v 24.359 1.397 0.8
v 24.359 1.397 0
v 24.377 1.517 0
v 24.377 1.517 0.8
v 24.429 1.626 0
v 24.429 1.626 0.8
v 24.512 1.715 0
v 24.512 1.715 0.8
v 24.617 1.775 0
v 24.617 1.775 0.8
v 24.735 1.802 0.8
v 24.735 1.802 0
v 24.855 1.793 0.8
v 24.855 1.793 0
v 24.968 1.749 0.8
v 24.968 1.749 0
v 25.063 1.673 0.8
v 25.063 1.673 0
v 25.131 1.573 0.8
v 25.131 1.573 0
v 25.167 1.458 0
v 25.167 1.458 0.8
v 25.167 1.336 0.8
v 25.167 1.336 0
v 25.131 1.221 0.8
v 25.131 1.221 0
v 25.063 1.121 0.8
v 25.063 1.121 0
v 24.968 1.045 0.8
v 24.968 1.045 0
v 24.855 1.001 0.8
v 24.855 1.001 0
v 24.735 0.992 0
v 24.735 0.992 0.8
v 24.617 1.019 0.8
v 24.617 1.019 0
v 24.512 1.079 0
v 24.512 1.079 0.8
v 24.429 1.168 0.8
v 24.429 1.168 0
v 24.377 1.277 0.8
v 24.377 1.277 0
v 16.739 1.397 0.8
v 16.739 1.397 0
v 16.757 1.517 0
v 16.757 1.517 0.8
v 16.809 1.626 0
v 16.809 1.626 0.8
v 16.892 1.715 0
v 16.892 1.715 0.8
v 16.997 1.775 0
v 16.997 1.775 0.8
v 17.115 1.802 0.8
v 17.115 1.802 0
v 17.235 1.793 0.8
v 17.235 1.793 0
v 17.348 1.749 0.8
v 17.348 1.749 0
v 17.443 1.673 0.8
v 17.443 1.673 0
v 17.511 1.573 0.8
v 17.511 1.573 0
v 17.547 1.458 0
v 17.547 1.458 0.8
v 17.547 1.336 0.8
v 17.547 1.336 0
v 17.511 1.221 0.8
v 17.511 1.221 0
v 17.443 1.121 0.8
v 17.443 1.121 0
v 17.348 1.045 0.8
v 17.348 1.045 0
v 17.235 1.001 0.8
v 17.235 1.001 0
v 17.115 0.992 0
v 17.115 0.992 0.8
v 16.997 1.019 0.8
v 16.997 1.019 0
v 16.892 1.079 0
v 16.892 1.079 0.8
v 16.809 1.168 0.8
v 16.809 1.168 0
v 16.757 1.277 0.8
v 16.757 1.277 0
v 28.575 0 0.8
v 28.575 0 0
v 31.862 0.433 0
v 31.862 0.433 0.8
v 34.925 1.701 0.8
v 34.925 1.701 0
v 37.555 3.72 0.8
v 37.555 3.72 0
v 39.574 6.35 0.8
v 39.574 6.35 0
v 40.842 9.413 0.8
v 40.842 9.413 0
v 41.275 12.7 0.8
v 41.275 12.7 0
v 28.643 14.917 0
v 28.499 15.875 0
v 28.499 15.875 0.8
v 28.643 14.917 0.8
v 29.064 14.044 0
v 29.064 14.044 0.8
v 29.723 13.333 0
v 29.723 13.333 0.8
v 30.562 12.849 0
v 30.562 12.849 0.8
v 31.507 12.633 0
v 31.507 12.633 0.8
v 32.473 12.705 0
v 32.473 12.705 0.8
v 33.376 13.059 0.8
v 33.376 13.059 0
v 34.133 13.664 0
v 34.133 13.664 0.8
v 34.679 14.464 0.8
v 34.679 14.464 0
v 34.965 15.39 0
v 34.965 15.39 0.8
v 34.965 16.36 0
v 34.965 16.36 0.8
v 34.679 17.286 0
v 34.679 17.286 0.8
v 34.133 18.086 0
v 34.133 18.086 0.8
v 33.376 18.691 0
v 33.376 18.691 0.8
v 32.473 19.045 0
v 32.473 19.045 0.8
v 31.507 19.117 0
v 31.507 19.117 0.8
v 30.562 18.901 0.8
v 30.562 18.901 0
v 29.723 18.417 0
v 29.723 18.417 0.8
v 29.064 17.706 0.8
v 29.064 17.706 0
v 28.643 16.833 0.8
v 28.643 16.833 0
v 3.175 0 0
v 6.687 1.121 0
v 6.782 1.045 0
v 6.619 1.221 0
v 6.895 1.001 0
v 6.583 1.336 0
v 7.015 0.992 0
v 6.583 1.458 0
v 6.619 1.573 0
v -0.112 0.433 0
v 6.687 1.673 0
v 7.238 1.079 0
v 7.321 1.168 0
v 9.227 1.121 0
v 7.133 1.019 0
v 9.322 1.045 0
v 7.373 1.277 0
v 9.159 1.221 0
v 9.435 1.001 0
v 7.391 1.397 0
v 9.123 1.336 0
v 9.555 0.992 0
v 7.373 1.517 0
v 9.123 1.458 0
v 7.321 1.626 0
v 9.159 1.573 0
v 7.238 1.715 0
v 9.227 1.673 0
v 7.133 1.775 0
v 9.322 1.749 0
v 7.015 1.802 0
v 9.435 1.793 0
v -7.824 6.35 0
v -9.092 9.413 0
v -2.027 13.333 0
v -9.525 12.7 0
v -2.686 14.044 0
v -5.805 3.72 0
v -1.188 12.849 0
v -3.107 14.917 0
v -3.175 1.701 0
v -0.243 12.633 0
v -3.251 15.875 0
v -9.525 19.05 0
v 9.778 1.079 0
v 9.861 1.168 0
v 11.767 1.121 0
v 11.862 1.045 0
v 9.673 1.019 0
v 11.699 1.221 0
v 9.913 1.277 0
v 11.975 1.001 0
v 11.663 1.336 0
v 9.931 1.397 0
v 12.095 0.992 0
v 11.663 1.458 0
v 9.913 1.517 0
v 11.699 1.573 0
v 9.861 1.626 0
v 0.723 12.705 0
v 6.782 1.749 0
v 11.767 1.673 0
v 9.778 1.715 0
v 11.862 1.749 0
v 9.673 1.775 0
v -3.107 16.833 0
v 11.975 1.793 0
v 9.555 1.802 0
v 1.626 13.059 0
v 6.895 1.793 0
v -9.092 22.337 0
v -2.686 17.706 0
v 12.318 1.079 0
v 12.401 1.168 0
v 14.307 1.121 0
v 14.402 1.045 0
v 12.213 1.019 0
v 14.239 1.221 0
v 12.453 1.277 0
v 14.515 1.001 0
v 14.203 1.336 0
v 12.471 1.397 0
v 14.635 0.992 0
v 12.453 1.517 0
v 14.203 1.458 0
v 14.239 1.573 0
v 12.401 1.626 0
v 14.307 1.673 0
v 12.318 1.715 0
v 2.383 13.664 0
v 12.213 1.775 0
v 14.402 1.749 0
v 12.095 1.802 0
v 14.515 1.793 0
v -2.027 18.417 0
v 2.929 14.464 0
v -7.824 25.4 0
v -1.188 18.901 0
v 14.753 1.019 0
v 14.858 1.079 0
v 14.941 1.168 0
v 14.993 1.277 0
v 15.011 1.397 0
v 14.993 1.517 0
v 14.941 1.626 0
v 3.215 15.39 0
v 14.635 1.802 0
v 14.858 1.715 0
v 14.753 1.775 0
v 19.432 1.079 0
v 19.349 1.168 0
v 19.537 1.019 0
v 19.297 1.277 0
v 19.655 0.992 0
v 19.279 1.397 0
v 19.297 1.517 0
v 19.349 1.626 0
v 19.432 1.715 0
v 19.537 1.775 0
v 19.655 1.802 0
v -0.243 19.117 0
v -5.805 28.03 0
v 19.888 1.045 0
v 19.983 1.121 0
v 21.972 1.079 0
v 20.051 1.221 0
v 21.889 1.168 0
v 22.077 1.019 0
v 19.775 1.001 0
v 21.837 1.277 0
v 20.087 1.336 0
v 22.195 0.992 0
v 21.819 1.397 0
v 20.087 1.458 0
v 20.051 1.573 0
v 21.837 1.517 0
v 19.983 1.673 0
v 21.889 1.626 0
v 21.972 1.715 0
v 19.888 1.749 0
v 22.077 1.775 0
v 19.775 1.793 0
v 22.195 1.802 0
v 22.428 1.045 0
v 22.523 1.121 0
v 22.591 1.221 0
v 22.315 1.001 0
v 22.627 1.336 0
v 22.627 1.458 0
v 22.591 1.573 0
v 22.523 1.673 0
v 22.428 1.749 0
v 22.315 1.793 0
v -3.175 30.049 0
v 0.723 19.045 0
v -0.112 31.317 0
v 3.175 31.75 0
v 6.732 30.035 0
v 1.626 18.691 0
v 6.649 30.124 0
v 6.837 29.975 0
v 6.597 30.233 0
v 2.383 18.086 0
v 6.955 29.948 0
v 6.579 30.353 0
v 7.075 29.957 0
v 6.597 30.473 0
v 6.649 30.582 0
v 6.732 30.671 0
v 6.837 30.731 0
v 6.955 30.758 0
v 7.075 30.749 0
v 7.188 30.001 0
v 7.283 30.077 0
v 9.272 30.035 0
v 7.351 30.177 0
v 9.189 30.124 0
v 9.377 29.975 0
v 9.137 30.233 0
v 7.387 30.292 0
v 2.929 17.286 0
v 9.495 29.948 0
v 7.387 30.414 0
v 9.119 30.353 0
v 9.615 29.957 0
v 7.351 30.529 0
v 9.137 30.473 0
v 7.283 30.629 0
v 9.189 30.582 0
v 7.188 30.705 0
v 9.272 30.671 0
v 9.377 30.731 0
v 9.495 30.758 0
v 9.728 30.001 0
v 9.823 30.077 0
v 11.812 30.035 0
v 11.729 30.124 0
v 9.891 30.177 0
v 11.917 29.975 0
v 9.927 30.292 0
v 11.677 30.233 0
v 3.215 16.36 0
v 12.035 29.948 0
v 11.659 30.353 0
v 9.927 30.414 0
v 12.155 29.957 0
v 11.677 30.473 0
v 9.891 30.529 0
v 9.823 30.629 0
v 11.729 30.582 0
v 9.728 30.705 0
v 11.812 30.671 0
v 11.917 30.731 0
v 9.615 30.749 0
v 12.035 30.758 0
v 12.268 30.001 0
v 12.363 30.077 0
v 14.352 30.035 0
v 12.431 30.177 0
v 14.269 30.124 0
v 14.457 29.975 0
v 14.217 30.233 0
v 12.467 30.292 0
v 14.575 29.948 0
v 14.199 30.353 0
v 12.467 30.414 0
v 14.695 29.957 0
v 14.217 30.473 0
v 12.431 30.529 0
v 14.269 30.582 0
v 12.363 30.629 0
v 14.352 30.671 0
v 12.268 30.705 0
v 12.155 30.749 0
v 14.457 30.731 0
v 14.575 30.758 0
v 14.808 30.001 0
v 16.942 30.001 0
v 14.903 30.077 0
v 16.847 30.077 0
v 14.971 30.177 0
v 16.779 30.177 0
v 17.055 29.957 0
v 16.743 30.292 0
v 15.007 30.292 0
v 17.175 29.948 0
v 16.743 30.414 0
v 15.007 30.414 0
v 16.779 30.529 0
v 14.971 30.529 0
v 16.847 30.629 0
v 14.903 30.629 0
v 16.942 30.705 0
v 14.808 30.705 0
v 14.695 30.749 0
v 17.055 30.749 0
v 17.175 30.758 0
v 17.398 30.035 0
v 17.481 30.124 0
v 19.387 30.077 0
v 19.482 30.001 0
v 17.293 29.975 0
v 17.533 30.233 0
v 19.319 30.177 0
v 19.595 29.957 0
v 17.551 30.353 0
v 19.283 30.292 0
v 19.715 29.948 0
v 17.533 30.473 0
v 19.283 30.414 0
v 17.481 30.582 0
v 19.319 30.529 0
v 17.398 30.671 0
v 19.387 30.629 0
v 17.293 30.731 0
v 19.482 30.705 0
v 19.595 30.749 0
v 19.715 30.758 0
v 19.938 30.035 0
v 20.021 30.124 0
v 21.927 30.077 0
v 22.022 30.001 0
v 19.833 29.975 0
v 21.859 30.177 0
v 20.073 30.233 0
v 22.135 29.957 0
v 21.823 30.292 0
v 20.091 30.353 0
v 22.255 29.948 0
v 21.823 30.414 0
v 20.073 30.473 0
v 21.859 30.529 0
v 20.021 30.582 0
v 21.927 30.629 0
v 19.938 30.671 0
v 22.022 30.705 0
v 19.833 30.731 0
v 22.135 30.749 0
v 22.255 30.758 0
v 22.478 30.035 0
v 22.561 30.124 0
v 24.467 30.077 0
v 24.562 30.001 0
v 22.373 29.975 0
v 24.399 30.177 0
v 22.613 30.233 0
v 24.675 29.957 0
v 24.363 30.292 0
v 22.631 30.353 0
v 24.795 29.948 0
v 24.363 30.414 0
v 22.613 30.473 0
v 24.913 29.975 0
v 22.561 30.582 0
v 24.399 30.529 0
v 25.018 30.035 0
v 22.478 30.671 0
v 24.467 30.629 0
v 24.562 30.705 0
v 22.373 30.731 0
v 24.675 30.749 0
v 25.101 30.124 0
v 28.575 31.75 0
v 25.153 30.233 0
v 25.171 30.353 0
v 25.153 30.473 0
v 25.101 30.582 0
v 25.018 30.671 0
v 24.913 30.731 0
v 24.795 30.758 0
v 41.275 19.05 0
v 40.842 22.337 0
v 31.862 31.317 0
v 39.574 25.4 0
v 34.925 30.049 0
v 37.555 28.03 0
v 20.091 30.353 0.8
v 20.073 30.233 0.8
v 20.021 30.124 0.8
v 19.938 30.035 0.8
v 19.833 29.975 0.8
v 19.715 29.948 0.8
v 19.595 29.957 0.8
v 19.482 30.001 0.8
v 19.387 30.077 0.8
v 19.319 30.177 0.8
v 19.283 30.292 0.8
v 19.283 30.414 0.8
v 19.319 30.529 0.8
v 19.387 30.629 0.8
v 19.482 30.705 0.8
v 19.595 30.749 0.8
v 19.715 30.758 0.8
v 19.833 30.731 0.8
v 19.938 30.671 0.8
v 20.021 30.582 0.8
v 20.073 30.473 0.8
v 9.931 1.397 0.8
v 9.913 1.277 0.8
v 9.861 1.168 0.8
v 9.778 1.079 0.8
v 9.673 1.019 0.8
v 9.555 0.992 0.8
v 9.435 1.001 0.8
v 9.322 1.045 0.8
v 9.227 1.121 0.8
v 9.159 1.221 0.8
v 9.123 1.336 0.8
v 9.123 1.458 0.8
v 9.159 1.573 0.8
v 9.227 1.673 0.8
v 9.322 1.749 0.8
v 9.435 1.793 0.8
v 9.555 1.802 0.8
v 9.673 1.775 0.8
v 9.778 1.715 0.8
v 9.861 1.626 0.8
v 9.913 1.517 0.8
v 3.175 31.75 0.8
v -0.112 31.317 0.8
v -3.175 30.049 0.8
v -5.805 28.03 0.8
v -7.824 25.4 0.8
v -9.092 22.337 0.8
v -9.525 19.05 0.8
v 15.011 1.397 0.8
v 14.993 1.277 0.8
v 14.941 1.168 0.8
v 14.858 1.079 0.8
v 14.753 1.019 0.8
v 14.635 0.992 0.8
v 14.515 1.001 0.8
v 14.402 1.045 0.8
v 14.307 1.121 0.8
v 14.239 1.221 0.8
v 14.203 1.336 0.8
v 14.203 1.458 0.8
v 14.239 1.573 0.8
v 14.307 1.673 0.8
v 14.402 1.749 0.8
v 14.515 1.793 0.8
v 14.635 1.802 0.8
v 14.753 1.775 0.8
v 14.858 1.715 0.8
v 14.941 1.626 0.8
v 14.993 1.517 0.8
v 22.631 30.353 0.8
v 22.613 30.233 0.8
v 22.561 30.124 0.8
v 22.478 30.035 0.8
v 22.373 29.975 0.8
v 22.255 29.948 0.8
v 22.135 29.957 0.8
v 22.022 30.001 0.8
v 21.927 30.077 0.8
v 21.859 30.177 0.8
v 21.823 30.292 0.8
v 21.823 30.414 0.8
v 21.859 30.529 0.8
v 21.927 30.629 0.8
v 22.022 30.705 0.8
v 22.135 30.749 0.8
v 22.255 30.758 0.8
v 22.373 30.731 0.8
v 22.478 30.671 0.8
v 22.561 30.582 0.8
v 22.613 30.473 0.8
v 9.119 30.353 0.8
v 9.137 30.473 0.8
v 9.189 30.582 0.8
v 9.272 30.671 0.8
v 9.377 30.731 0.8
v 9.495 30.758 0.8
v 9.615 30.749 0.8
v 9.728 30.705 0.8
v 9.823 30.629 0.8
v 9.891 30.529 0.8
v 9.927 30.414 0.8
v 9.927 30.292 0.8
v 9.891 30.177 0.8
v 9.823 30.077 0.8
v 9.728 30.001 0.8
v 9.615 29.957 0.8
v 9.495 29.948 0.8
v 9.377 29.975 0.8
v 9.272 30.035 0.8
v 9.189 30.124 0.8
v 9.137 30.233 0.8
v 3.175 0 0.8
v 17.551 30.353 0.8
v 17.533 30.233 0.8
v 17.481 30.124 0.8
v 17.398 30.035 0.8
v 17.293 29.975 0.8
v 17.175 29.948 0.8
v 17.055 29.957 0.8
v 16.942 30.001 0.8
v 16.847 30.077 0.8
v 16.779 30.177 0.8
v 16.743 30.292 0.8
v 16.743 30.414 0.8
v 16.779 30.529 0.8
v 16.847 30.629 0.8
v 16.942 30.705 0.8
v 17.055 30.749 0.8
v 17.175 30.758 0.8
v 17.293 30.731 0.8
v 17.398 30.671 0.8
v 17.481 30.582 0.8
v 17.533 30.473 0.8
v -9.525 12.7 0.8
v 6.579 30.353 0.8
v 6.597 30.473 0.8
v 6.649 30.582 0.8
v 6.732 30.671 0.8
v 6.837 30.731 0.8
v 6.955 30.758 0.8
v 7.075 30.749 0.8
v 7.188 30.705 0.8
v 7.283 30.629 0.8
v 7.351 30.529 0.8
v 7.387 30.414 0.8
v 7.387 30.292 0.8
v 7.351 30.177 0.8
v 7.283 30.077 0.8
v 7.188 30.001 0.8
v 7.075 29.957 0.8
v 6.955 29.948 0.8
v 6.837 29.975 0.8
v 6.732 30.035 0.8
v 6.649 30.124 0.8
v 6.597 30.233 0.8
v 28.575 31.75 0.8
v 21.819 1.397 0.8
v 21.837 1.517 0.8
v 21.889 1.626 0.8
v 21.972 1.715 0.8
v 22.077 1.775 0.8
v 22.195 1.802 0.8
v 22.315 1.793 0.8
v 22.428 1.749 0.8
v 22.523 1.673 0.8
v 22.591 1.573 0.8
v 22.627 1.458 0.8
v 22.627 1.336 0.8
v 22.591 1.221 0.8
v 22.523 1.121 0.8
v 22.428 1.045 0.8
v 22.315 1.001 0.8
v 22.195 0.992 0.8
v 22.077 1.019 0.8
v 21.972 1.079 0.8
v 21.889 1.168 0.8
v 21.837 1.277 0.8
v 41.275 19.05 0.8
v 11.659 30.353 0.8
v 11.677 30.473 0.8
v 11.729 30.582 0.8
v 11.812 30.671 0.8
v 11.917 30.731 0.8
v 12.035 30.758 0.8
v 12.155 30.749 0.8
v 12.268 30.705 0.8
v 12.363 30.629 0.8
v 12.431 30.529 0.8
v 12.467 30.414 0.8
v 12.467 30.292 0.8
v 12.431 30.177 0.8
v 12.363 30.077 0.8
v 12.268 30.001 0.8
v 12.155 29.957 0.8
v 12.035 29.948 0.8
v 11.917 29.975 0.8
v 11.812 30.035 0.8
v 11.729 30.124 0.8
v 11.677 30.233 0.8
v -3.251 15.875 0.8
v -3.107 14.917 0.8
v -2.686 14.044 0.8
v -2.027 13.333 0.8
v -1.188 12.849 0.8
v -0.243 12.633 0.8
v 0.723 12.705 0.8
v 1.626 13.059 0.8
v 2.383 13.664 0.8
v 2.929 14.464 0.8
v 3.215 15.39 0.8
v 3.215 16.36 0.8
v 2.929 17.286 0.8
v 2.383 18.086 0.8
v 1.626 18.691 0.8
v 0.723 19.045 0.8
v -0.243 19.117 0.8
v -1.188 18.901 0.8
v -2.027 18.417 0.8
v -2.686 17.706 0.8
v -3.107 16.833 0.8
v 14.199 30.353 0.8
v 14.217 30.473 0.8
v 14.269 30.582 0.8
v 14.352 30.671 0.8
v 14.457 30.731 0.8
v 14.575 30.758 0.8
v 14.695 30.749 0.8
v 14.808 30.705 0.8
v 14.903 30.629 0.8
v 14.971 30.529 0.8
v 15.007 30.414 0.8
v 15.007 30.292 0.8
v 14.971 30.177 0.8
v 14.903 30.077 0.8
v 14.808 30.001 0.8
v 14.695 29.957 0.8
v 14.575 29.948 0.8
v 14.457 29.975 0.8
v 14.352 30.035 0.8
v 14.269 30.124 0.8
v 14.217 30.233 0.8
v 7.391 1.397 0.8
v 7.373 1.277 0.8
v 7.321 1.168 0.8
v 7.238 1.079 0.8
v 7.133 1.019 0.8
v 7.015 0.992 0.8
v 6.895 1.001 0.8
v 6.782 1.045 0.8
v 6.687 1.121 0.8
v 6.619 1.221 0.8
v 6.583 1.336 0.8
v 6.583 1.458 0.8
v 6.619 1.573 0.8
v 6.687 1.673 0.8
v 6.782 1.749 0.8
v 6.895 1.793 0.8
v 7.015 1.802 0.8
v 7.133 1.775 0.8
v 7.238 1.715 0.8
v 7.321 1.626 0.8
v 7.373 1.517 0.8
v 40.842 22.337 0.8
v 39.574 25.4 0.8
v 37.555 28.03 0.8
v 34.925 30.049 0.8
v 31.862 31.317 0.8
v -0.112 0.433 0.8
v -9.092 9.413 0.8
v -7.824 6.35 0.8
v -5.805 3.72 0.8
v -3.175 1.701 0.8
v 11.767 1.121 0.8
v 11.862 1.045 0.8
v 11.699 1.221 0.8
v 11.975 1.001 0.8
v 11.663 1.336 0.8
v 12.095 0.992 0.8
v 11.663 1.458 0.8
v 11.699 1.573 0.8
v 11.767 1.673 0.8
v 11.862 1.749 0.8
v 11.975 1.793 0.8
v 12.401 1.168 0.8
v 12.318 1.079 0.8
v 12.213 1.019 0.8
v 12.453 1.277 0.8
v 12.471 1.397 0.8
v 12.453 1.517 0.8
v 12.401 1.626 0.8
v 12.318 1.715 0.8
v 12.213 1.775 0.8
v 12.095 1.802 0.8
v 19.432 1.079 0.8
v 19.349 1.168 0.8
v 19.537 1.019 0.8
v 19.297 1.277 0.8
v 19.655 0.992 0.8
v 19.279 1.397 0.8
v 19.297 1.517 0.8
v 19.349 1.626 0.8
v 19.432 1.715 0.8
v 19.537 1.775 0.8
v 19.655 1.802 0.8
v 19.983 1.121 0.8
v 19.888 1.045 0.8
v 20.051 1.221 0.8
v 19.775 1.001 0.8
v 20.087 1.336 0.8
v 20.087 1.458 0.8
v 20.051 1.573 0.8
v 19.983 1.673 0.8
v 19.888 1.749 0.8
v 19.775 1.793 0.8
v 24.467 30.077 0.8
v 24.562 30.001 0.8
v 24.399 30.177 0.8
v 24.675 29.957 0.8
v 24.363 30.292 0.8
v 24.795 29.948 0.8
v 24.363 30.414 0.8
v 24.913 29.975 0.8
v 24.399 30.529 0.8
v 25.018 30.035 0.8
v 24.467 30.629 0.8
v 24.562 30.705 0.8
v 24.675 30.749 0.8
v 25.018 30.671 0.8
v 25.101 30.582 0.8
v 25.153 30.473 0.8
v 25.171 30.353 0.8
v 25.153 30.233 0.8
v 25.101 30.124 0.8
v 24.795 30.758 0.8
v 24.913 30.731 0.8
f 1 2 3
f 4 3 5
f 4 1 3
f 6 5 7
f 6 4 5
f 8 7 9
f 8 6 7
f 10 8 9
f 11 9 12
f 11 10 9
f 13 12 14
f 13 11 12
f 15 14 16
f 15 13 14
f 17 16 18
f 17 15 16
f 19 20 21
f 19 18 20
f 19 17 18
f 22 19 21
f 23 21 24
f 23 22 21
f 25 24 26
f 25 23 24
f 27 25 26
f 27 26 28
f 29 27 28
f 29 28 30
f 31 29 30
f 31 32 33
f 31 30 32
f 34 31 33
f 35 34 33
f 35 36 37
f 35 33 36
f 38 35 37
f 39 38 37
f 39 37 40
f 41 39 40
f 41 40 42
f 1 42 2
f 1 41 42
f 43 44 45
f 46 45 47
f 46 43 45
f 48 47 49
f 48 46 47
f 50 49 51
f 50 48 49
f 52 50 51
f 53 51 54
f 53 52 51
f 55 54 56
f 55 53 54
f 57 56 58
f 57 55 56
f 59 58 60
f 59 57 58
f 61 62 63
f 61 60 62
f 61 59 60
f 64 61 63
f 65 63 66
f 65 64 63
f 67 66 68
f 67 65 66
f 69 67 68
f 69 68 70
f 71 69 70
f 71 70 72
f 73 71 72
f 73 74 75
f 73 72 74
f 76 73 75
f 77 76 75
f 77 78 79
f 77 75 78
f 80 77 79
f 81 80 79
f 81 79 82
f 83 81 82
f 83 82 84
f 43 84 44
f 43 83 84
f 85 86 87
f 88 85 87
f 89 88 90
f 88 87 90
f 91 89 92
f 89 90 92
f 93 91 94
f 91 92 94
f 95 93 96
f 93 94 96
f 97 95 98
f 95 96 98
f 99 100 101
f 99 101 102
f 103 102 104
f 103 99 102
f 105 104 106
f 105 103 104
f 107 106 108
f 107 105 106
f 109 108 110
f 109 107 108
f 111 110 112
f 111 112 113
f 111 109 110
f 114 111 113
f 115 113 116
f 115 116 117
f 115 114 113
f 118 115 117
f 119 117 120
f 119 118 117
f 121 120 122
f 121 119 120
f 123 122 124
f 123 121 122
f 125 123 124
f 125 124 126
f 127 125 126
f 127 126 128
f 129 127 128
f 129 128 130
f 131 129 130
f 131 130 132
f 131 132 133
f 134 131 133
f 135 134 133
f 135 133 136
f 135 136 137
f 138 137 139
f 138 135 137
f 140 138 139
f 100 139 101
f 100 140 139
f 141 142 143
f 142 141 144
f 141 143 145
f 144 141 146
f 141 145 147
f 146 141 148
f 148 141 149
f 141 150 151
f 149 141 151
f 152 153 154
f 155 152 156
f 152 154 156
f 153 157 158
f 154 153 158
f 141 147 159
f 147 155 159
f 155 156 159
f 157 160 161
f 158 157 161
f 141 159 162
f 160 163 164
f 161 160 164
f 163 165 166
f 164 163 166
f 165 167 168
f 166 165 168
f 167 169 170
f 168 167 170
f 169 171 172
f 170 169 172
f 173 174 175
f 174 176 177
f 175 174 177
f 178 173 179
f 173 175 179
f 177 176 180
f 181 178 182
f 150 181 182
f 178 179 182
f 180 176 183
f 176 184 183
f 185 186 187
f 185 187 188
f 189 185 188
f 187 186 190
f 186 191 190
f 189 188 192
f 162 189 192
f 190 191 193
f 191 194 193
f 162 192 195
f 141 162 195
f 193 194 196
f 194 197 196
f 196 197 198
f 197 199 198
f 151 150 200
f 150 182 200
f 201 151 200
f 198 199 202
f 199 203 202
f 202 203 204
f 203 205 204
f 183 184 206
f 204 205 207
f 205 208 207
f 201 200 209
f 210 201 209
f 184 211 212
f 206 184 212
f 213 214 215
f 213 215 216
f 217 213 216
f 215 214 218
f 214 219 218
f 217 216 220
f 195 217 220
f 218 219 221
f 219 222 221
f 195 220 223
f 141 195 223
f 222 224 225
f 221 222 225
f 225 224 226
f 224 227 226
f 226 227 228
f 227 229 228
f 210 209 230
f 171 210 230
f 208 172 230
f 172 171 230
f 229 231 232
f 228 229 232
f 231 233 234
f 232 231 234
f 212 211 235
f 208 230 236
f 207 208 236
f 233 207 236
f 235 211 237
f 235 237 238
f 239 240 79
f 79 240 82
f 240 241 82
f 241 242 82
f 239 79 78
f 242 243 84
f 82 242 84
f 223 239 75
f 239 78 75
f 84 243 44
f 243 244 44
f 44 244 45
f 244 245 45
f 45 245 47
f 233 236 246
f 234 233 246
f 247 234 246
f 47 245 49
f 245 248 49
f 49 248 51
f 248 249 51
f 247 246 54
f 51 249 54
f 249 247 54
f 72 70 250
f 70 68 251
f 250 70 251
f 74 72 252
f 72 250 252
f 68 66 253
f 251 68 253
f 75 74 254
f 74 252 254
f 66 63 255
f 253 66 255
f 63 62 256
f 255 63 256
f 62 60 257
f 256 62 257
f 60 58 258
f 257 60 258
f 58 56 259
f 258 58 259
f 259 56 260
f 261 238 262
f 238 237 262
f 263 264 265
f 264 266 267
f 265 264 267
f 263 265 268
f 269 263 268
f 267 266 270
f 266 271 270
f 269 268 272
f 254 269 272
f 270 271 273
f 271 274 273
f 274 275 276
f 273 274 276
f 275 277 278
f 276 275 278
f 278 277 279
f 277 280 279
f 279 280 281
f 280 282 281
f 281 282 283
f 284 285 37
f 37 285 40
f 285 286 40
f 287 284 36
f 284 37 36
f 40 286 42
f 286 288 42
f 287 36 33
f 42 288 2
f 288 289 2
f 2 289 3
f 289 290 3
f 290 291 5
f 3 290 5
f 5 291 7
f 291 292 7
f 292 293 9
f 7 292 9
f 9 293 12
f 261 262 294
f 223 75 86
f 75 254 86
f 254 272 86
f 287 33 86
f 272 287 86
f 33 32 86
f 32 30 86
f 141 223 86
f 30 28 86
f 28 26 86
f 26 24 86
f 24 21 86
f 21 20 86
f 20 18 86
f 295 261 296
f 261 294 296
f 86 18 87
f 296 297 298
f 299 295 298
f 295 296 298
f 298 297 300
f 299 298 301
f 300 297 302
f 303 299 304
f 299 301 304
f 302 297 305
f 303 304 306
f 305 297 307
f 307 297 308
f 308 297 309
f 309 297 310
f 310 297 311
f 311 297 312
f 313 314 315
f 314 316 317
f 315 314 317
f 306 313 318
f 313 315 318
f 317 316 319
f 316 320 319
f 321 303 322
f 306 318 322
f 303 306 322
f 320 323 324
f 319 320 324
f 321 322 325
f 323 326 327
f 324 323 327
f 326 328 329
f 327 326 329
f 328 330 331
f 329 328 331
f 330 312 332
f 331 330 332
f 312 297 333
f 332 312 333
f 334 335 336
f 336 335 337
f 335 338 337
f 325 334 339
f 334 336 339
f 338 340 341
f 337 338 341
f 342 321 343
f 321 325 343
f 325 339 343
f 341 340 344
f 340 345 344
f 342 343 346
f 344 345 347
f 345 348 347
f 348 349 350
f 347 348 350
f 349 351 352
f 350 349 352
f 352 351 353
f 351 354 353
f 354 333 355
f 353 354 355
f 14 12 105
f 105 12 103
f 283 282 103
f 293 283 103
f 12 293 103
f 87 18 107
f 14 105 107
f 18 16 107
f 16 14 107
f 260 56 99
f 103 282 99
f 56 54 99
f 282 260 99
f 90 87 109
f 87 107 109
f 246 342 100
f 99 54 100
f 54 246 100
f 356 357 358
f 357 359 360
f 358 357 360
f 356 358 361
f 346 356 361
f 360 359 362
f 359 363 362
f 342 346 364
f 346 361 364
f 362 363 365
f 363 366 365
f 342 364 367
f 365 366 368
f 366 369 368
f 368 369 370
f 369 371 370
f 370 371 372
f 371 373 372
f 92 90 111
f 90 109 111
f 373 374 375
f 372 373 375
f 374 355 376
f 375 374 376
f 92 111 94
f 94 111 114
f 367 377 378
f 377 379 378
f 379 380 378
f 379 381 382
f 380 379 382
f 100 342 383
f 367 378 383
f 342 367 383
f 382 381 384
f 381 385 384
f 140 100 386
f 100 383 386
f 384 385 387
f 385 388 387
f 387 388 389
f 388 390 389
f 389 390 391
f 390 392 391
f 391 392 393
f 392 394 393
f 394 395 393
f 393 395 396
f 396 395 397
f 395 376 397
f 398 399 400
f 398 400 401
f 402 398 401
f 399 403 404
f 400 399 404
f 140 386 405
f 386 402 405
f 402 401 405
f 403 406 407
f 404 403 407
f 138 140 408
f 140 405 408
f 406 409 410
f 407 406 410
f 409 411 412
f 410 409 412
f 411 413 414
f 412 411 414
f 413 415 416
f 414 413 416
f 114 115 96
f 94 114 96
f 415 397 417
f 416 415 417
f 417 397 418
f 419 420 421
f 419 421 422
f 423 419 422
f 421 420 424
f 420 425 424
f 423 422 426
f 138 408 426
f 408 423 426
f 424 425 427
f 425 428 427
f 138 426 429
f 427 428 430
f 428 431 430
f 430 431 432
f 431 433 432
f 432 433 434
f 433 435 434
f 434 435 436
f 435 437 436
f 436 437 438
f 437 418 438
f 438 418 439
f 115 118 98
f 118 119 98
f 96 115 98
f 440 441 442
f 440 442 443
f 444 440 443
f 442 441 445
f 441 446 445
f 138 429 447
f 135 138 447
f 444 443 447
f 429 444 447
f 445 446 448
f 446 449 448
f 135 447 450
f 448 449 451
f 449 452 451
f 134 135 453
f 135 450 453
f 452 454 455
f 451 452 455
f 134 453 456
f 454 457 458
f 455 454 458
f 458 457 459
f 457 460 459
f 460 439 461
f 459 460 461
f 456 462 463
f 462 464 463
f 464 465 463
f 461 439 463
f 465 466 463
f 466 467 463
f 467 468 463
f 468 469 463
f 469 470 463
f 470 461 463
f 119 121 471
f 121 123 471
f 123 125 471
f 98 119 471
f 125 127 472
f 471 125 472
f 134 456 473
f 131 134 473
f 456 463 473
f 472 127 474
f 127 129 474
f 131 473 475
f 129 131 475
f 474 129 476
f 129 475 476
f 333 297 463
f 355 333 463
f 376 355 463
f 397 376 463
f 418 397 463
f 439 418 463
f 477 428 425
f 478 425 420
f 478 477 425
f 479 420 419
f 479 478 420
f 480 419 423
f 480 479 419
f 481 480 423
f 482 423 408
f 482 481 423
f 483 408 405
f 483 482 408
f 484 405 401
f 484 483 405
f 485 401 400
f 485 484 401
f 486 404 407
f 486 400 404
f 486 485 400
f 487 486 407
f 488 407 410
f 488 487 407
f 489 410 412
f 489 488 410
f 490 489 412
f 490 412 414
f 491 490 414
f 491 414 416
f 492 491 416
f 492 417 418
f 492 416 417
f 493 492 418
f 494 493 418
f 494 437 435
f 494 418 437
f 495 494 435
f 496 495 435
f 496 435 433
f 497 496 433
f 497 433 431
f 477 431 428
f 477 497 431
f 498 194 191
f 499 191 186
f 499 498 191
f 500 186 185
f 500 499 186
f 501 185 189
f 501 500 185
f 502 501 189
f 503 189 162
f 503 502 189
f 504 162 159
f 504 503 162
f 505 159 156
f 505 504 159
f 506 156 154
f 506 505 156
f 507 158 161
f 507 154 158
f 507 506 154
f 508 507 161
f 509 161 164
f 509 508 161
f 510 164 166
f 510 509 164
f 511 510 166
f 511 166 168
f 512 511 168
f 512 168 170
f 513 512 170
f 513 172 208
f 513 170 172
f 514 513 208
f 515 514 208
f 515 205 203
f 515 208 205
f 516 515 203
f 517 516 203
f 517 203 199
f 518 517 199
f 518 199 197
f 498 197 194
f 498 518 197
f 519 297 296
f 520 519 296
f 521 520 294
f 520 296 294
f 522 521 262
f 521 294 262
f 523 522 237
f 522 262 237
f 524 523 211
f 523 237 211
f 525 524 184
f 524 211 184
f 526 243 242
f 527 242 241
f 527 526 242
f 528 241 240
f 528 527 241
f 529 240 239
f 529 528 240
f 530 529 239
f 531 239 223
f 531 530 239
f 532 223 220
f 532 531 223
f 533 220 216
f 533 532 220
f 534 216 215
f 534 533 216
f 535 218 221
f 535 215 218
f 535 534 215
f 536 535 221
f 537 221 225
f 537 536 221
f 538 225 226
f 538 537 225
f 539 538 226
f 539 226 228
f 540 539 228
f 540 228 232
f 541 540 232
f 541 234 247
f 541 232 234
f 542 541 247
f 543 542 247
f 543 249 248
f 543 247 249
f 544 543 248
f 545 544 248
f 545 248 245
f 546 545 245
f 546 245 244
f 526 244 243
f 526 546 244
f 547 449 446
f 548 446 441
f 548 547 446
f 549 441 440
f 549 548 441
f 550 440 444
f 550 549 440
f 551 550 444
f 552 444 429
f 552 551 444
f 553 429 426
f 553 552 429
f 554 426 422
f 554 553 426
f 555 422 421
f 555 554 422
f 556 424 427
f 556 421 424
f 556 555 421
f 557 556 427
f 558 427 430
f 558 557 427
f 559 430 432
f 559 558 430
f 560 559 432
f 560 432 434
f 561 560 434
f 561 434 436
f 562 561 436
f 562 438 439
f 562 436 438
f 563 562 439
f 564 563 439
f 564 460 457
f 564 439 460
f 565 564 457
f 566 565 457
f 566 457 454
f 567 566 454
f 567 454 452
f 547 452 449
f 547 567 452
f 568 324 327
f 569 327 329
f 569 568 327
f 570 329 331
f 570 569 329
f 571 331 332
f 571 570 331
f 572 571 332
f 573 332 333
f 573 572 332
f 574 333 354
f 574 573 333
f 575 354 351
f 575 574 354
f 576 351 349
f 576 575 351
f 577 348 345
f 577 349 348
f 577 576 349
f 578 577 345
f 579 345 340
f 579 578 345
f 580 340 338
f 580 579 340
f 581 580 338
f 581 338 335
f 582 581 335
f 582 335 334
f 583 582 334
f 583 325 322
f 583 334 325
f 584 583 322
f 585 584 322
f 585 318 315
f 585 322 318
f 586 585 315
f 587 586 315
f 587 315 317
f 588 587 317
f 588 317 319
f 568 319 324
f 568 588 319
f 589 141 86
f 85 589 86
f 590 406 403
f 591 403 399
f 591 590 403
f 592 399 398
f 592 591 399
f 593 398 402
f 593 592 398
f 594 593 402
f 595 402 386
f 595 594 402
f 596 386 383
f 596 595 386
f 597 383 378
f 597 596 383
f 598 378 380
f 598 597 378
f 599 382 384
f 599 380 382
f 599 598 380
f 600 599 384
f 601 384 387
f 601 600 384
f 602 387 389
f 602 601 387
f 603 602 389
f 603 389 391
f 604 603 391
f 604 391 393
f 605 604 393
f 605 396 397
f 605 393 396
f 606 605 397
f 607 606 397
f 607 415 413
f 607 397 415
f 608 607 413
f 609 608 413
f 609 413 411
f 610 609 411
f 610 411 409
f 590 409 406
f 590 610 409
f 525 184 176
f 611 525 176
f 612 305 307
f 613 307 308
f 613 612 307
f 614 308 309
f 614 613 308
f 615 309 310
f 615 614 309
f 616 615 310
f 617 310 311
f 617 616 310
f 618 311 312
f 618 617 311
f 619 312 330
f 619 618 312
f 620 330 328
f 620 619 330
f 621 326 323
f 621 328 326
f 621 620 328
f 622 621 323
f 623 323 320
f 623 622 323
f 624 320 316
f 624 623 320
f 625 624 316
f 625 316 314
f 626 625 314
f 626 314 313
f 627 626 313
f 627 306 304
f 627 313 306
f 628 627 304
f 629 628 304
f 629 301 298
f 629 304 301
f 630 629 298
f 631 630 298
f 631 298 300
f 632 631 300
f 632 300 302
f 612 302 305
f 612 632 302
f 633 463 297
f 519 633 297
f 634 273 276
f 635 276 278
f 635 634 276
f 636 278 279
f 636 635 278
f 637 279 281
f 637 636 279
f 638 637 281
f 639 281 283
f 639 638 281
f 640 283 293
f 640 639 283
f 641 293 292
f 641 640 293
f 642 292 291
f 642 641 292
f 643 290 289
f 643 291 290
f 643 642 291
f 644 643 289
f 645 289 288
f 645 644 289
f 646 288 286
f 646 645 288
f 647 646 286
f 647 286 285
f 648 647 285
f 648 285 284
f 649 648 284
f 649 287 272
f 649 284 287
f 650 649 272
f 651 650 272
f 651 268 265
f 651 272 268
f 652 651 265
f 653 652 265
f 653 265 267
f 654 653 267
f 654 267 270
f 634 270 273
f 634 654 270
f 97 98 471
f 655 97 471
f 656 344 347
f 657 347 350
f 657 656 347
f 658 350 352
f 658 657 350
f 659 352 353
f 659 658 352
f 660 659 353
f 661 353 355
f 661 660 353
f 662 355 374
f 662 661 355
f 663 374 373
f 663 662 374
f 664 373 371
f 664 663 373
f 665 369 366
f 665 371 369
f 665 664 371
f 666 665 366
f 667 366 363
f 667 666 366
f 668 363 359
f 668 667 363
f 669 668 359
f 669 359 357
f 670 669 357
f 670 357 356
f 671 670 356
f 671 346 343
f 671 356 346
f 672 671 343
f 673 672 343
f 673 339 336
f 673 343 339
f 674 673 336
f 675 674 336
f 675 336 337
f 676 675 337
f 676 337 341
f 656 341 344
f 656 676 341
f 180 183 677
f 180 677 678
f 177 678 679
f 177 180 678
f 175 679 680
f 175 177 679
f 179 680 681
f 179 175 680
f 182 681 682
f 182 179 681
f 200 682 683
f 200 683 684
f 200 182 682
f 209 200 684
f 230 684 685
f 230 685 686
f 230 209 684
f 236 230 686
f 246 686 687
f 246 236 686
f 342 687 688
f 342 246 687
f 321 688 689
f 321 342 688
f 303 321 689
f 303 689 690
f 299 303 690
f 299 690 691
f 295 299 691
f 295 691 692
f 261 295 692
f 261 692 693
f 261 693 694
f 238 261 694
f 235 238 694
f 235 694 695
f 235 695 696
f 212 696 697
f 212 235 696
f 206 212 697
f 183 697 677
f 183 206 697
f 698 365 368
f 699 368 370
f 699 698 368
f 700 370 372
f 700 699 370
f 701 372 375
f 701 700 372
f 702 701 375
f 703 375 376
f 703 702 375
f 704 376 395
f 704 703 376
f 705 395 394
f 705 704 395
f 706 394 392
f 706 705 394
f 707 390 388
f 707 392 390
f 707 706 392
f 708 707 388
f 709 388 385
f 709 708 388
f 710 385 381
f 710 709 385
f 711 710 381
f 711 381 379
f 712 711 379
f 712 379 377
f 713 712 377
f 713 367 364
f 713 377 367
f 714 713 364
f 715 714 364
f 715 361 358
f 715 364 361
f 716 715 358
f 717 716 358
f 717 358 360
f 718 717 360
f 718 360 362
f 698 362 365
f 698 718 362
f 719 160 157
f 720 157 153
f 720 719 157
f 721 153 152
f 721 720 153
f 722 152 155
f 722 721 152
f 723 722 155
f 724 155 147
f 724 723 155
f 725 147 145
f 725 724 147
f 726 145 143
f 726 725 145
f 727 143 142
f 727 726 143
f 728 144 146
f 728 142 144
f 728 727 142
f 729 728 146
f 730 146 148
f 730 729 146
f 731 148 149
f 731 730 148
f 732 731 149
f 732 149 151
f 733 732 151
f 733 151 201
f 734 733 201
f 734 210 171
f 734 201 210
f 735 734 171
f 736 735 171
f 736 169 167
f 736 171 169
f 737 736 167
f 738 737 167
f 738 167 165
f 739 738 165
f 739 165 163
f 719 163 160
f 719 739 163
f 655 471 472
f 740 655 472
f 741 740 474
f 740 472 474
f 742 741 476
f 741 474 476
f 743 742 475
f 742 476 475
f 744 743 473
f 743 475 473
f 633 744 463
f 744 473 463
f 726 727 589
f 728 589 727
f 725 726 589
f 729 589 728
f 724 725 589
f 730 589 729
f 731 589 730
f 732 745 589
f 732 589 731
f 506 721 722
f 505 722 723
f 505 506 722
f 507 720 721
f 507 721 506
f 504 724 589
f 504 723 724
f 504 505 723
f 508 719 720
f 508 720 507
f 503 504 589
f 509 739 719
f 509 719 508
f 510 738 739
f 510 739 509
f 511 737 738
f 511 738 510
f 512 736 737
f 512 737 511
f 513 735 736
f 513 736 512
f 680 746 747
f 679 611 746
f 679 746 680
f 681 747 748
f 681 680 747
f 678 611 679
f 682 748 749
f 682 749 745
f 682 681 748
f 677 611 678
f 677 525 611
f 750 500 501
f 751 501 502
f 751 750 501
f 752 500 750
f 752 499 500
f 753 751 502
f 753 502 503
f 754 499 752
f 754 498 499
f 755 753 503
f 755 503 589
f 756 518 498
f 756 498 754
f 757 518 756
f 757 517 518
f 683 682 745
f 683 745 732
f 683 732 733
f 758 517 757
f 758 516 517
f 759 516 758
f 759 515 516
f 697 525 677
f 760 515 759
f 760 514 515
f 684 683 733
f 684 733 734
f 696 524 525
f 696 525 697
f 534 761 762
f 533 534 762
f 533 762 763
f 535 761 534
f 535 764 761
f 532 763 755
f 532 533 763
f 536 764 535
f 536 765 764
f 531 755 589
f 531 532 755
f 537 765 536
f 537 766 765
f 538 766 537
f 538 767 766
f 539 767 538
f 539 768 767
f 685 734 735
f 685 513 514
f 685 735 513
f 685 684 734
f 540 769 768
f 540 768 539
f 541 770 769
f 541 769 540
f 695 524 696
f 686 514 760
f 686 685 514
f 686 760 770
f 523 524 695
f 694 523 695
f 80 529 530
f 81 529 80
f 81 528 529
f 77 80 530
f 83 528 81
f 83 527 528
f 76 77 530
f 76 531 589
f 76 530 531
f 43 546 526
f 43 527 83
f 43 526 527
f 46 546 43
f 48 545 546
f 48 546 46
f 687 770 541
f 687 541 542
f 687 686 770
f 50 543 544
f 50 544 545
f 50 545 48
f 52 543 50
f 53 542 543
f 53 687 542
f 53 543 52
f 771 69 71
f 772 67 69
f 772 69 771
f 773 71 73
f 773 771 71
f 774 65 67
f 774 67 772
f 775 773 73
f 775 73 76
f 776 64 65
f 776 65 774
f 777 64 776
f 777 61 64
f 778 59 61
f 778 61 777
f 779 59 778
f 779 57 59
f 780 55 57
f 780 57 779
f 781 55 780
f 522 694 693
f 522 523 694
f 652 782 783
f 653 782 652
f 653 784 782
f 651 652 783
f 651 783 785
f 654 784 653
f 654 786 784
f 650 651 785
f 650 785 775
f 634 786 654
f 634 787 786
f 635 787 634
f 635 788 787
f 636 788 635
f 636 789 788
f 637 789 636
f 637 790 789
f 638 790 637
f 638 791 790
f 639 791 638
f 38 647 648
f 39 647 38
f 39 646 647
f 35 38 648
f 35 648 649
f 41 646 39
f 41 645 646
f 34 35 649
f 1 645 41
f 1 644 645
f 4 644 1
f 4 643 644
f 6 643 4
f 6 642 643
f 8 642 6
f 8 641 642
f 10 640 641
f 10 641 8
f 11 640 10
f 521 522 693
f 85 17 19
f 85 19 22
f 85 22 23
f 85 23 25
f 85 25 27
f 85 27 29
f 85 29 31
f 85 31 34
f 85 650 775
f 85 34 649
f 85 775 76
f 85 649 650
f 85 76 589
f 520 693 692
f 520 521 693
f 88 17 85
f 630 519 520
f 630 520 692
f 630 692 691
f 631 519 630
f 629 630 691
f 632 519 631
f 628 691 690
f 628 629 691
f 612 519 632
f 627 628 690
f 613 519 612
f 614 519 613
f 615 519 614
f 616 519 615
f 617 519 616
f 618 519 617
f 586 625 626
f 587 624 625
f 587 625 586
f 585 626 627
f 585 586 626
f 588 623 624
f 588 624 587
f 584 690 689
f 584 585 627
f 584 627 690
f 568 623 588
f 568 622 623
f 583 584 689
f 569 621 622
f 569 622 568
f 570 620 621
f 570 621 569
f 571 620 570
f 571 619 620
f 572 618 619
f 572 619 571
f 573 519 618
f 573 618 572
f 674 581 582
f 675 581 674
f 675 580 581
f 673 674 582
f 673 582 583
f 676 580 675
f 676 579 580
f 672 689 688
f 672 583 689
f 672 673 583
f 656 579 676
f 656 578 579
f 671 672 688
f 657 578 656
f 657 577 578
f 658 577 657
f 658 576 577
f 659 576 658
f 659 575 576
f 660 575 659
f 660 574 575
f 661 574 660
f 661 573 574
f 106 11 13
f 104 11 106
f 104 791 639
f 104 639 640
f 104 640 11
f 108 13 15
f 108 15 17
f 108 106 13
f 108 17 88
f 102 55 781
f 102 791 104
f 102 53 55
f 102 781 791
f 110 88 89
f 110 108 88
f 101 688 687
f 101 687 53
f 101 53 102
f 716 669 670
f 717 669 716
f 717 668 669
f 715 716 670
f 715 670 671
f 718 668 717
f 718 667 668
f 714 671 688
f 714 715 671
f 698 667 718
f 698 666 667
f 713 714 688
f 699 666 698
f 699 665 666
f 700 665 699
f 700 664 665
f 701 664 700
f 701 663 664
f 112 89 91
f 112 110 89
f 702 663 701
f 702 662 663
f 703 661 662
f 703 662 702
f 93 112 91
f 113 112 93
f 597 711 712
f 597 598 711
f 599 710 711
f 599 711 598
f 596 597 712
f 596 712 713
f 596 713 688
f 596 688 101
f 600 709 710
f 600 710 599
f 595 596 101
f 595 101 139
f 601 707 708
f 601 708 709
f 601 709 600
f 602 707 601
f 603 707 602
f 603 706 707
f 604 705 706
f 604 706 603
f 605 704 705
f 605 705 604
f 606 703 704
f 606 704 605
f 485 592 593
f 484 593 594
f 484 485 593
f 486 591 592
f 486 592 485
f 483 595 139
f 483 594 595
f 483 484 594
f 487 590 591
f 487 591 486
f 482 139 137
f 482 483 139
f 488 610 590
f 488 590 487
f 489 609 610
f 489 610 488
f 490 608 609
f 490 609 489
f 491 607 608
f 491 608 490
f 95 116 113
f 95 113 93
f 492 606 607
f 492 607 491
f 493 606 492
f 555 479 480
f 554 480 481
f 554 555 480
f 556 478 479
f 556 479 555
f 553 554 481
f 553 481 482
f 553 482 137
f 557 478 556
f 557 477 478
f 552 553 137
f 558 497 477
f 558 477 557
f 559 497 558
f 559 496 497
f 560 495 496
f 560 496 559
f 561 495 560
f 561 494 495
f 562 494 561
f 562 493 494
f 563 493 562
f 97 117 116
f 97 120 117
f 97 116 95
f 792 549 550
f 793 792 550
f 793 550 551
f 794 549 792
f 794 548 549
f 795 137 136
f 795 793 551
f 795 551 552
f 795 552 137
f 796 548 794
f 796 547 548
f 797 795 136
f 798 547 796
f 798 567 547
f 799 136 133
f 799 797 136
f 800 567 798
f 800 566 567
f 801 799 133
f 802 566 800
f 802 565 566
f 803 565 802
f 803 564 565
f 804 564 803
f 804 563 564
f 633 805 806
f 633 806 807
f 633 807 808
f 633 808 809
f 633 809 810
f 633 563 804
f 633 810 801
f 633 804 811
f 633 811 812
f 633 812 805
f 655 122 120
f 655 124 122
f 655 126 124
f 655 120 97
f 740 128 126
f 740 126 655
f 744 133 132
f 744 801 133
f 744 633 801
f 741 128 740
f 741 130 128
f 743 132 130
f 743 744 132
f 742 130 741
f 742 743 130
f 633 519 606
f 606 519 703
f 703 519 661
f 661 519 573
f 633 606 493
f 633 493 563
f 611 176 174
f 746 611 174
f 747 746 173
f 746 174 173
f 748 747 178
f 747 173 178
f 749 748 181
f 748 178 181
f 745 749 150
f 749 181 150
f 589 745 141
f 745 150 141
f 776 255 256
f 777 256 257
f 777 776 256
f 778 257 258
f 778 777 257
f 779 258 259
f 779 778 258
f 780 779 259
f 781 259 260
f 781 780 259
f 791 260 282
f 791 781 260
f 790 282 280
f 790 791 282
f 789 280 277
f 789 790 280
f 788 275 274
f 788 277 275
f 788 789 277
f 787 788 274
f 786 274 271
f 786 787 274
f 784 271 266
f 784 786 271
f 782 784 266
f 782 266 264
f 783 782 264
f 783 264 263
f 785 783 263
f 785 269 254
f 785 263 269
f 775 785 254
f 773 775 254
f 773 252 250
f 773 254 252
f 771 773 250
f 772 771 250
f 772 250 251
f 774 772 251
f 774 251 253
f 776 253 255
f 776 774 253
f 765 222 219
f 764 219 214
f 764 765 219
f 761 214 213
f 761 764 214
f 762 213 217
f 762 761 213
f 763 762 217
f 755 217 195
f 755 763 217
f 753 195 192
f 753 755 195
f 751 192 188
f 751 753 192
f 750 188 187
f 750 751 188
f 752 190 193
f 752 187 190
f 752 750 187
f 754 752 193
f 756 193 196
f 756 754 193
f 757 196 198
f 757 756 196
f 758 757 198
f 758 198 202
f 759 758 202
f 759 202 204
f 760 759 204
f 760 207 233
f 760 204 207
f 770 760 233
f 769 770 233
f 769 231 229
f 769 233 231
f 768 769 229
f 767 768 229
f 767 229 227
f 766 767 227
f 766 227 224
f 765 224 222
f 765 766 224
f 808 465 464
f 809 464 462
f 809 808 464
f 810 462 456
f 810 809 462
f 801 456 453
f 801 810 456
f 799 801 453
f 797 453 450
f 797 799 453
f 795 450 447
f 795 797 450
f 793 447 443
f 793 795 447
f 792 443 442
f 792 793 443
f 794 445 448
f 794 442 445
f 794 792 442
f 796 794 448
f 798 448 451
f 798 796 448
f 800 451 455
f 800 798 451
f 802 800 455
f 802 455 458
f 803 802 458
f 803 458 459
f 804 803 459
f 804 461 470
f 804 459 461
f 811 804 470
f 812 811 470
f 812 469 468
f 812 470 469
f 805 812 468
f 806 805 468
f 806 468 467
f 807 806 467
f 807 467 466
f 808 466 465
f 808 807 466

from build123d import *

# Parameters (mm, degrees)
SKETCH1_R           = 3.2512
BOSS_EXTRUDE1_DEPTH = 0.800000051
SKETCH3_R           = 0.4064
CUT_EXTRUDE3_DEPTH  = 53.080016562


with BuildPart() as part:
    # Sketch1 → Boss-Extrude1 (new body)
    with BuildSketch(Plane.XY):
        with BuildLine():
            Line((28.575, 31.75), (3.175, 31.75))
            ThreePointArc((3.175, 31.75), (-5.805256121, 28.030256121), (-9.525, 19.05))
            Line((-9.525, 19.05), (-9.525, 12.7))
            ThreePointArc((-9.525, 12.7), (-5.805256121, 3.719743879), (3.175, 0))
            Line((3.175, 0), (28.575, 0))
            ThreePointArc((28.575, 0), (37.555256121, 3.719743879), (41.275, 12.7))
            Line((41.275, 12.7), (41.275, 19.05))
            ThreePointArc((41.275, 19.05), (37.555256121, 28.030256121), (28.575, 31.75))
        make_face()
        with Locations(Location((0, 15.875, 0), (0, 0, 180))):
            Circle(SKETCH1_R, mode=Mode.SUBTRACT)
        with Locations(Location((31.75, 15.875, 0), (0, 0, 180))):
            Circle(SKETCH1_R, mode=Mode.SUBTRACT)
    extrude(amount=BOSS_EXTRUDE1_DEPTH)

    # Sketch3 → Cut-Extrude3 (cut, through all)
    with BuildSketch(Plane(origin=(0, 0, 0.800000051), x_dir=(-1, 0, 0), z_dir=(0, 0, -1))):
        with Locations((-14.605, 30.353)):
            Circle(SKETCH3_R)
        with Locations((-12.065, 30.353)):
            Circle(SKETCH3_R)
        with Locations((-9.525, 30.353)):
            Circle(SKETCH3_R)
        with Locations((-6.985, 30.353)):
            Circle(SKETCH3_R)
        with Locations(Location((-24.765, 30.353, 0), (0, 0, 180))):
            Circle(SKETCH3_R)
        with Locations(Location((-22.225, 30.353, 0), (0, 0, 180))):
            Circle(SKETCH3_R)
        with Locations(Location((-19.685, 30.353, 0), (0, 0, 180))):
            Circle(SKETCH3_R)
        with Locations(Location((-17.145, 30.353, 0), (0, 0, 180))):
            Circle(SKETCH3_R)
        with Locations((-17.145, 1.397)):
            Circle(SKETCH3_R)
        with Locations((-19.685, 1.397)):
            Circle(SKETCH3_R)
        with Locations((-22.225, 1.397)):
            Circle(SKETCH3_R)
        with Locations((-24.765, 1.397)):
            Circle(SKETCH3_R)
        with Locations(Location((-6.985, 1.397, 0), (0, 0, 180))):
            Circle(SKETCH3_R)
        with Locations(Location((-9.525, 1.397, 0), (0, 0, 180))):
            Circle(SKETCH3_R)
        with Locations(Location((-12.065, 1.397, 0), (0, 0, 180))):
            Circle(SKETCH3_R)
        with Locations(Location((-14.605, 1.397, 0), (0, 0, 180))):
            Circle(SKETCH3_R)
    extrude(amount=CUT_EXTRUDE3_DEPTH, mode=Mode.SUBTRACT)


solid = part.part
